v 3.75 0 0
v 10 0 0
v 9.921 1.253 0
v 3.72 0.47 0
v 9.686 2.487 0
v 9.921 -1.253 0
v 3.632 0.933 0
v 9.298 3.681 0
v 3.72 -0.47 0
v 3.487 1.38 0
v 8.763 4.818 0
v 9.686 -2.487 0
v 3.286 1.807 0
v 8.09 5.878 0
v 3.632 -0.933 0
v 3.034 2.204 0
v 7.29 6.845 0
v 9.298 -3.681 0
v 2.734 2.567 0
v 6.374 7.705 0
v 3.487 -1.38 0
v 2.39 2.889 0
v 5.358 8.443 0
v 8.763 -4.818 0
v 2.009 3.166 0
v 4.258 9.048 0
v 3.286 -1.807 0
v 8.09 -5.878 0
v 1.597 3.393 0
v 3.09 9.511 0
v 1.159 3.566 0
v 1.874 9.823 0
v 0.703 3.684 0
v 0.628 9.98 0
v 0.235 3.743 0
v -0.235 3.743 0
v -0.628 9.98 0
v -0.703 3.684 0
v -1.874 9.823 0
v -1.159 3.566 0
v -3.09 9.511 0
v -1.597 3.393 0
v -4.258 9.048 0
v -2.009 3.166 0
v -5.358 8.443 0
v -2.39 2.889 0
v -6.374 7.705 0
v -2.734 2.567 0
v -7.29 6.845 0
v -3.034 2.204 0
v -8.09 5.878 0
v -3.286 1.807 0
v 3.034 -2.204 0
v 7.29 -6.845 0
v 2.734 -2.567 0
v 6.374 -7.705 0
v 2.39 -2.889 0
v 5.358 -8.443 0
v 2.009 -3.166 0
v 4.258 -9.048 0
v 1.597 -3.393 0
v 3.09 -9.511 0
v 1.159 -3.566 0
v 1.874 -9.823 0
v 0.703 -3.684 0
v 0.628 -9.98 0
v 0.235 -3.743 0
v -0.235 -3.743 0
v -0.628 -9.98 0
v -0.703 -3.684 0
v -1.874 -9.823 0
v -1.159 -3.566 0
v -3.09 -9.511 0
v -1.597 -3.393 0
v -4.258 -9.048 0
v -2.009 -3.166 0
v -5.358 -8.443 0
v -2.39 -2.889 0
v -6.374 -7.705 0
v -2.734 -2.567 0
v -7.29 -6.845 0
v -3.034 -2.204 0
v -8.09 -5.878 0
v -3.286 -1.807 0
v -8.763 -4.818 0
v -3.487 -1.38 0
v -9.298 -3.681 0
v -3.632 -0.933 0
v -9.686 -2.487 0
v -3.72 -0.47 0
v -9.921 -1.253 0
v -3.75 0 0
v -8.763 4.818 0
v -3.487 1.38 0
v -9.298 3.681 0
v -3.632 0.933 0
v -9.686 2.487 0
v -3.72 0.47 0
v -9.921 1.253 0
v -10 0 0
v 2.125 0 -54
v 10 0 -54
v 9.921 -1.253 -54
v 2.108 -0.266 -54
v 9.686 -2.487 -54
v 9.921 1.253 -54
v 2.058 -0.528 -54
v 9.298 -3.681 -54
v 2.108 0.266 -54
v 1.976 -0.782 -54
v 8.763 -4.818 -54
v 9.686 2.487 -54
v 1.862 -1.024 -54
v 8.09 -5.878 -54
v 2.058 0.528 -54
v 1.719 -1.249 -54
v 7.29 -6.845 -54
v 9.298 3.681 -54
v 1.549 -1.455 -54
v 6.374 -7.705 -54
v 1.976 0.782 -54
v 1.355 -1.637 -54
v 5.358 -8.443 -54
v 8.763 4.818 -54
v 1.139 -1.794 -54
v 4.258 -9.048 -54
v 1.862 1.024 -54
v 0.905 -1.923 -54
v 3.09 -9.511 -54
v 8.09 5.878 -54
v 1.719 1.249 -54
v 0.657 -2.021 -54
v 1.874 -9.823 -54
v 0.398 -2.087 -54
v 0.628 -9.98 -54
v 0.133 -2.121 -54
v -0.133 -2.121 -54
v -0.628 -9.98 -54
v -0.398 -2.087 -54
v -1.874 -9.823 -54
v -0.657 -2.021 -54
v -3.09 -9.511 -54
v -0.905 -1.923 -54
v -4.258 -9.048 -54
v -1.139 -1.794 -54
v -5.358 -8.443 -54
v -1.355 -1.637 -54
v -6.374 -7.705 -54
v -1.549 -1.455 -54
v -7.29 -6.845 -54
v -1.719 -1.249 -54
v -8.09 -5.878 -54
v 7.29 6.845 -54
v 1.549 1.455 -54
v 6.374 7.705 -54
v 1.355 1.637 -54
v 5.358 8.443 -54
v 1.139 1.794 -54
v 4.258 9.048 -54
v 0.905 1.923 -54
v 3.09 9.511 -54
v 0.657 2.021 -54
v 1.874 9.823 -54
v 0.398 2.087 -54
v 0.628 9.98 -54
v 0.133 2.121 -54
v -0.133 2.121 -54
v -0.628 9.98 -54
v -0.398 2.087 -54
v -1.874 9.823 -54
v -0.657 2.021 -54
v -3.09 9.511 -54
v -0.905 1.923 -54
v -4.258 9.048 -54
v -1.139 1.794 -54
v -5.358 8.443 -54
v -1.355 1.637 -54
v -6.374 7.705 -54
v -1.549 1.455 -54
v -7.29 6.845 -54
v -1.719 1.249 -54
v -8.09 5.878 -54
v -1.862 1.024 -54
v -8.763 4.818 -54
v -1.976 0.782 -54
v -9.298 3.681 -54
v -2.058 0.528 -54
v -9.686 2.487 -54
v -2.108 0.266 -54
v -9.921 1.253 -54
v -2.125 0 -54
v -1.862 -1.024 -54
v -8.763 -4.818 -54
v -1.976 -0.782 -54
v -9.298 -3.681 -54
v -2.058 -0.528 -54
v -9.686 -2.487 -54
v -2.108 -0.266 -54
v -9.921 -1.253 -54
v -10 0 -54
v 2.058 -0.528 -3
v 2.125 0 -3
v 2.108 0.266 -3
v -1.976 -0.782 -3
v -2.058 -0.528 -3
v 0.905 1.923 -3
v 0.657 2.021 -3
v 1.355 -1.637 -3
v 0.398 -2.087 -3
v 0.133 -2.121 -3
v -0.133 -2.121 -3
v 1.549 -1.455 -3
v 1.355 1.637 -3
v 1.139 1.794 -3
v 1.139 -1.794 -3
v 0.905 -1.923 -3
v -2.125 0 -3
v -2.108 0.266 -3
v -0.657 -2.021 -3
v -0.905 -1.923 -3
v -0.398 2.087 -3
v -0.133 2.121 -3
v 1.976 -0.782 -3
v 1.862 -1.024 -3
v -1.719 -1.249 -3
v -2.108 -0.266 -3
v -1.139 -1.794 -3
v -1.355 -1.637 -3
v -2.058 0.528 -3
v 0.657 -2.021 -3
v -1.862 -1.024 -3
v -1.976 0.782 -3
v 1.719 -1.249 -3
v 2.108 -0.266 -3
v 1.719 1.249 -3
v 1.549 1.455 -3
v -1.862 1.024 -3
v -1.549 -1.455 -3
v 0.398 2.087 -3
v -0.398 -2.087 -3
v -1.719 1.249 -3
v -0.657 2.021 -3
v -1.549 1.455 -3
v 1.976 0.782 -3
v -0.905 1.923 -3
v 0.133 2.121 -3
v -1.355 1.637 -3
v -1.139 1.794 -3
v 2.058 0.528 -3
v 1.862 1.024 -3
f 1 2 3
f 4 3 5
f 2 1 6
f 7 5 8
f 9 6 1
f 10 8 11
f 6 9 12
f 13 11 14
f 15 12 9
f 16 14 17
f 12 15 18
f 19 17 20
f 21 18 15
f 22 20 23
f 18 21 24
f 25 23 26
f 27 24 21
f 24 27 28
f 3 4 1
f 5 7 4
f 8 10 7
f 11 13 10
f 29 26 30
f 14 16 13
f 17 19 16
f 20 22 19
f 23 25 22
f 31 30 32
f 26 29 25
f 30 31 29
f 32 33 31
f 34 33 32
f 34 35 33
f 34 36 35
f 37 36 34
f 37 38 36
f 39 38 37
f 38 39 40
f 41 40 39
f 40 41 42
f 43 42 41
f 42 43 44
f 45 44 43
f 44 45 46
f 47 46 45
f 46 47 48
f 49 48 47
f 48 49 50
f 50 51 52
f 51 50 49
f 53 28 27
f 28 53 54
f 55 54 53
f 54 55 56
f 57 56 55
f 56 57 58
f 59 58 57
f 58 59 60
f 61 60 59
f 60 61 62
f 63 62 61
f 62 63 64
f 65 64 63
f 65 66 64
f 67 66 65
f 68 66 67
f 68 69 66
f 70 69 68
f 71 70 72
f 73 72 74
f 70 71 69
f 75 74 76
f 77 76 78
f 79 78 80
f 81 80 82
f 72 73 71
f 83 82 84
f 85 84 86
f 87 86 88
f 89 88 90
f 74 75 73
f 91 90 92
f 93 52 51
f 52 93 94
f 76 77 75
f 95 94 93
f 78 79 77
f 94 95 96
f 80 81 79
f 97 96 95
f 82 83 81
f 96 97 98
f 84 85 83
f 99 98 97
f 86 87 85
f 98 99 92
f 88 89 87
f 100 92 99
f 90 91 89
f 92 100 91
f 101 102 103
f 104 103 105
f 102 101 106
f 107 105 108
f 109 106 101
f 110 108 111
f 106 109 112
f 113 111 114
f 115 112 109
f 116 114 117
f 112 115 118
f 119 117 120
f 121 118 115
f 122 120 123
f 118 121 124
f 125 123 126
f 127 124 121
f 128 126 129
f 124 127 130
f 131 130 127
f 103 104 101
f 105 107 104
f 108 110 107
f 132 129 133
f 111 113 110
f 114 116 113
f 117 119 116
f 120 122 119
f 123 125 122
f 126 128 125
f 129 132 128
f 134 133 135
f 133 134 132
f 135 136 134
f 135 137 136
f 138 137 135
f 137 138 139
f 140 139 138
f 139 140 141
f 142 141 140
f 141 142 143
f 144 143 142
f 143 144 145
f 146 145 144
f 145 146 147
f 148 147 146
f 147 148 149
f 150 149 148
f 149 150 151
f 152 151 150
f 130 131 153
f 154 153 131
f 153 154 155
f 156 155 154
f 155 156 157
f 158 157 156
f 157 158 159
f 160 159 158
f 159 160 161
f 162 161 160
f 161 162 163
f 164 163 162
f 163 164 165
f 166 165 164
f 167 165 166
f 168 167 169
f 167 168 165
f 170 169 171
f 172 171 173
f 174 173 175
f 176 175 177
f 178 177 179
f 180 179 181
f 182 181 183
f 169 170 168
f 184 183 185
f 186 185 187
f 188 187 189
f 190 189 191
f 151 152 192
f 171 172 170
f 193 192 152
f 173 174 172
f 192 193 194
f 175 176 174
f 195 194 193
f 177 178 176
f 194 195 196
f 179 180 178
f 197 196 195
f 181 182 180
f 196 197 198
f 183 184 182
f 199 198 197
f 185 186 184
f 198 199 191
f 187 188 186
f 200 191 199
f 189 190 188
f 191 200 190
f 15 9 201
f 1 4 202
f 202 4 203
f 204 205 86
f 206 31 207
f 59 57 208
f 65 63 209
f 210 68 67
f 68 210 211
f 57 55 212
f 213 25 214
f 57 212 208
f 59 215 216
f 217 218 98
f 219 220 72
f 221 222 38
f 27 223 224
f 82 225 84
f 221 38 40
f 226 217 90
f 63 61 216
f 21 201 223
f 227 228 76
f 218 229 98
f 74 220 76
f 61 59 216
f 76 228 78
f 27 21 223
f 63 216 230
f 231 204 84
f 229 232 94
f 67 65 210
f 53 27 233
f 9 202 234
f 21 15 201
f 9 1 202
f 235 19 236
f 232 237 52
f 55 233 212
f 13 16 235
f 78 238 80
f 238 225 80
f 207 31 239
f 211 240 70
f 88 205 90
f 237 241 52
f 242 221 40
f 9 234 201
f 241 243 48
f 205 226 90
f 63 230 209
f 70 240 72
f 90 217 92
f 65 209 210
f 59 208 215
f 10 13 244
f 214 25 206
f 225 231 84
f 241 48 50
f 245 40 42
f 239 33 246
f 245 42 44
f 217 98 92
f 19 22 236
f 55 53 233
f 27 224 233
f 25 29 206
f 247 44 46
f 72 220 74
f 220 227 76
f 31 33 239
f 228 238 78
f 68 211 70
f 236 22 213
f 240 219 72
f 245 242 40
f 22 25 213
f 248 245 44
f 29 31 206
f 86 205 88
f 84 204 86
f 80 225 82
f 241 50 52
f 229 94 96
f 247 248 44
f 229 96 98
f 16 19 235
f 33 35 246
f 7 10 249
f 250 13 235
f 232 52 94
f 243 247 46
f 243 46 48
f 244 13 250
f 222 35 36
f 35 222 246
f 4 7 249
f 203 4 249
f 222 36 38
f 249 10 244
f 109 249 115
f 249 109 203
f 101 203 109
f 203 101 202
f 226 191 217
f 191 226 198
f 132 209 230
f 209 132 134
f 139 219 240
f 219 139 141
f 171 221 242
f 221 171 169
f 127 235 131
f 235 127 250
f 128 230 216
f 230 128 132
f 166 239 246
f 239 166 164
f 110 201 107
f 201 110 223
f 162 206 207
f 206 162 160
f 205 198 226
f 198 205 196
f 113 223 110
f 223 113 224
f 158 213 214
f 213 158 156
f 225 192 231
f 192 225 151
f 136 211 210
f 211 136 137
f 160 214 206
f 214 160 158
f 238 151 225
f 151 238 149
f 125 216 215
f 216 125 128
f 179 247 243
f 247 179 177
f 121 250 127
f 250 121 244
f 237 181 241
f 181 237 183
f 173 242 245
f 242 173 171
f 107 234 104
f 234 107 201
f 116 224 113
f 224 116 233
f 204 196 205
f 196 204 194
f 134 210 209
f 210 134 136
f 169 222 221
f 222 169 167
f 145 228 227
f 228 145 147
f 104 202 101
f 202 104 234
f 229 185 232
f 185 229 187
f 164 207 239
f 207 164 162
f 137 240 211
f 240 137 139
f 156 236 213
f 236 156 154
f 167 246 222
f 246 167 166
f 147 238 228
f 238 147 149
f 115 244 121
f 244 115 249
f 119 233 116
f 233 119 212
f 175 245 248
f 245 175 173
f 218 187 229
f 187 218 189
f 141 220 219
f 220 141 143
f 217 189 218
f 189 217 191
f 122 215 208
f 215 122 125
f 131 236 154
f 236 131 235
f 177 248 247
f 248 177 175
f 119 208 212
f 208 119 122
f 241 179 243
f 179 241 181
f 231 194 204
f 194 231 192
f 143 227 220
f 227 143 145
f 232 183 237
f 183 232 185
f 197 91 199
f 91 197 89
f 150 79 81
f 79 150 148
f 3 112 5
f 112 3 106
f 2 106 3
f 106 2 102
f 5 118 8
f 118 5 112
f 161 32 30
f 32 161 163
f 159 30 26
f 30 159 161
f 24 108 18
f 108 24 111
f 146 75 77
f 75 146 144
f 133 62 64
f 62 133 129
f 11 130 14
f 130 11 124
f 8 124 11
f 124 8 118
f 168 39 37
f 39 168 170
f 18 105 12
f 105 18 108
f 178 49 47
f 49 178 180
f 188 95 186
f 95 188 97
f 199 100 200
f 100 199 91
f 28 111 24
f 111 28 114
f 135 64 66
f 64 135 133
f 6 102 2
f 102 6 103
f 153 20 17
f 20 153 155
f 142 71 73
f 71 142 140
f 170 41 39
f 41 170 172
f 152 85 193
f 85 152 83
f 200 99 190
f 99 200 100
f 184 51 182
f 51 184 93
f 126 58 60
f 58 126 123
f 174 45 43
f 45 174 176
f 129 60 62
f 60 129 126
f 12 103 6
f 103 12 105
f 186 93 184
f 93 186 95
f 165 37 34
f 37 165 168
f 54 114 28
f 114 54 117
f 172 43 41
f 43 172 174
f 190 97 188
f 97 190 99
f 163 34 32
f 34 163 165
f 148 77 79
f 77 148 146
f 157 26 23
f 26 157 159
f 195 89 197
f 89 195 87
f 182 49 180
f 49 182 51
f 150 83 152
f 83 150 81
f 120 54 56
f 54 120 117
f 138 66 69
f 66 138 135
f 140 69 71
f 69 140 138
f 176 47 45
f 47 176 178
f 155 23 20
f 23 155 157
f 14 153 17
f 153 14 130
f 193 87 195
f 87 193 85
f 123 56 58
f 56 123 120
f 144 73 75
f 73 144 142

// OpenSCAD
$fn = 50;


difference() {
	union() {
		translate(v = [0, 0, -54.0000000000]) {
			cylinder(h = 54, r = 10.0000000000);
		}
		cylinder(h = 0, r = 13.0000000000);
	}
	union() {
		translate(v = [0, 0, 0]) {
			rotate(a = [0, 0, 0]) {
				difference() {
					union() {
						#translate(v = [0, 0, -54.0000000000]) {
							cylinder(h = 54, r = 2.0000000000);
						}
						#translate(v = [0, 0, -3]) {
							cylinder(h = 3, r1 = 2.1250000000, r2 = 3.7500000000);
						}
						#translate(v = [0, 0, -54.0000000000]) {
							cylinder(h = 54, r = 2.1250000000);
						}
						#translate(v = [0, 0, -54.0000000000]) {
							cylinder(h = 54, r = 2.0000000000);
						}
					}
					union();
				}
			}
		}
	}
}
